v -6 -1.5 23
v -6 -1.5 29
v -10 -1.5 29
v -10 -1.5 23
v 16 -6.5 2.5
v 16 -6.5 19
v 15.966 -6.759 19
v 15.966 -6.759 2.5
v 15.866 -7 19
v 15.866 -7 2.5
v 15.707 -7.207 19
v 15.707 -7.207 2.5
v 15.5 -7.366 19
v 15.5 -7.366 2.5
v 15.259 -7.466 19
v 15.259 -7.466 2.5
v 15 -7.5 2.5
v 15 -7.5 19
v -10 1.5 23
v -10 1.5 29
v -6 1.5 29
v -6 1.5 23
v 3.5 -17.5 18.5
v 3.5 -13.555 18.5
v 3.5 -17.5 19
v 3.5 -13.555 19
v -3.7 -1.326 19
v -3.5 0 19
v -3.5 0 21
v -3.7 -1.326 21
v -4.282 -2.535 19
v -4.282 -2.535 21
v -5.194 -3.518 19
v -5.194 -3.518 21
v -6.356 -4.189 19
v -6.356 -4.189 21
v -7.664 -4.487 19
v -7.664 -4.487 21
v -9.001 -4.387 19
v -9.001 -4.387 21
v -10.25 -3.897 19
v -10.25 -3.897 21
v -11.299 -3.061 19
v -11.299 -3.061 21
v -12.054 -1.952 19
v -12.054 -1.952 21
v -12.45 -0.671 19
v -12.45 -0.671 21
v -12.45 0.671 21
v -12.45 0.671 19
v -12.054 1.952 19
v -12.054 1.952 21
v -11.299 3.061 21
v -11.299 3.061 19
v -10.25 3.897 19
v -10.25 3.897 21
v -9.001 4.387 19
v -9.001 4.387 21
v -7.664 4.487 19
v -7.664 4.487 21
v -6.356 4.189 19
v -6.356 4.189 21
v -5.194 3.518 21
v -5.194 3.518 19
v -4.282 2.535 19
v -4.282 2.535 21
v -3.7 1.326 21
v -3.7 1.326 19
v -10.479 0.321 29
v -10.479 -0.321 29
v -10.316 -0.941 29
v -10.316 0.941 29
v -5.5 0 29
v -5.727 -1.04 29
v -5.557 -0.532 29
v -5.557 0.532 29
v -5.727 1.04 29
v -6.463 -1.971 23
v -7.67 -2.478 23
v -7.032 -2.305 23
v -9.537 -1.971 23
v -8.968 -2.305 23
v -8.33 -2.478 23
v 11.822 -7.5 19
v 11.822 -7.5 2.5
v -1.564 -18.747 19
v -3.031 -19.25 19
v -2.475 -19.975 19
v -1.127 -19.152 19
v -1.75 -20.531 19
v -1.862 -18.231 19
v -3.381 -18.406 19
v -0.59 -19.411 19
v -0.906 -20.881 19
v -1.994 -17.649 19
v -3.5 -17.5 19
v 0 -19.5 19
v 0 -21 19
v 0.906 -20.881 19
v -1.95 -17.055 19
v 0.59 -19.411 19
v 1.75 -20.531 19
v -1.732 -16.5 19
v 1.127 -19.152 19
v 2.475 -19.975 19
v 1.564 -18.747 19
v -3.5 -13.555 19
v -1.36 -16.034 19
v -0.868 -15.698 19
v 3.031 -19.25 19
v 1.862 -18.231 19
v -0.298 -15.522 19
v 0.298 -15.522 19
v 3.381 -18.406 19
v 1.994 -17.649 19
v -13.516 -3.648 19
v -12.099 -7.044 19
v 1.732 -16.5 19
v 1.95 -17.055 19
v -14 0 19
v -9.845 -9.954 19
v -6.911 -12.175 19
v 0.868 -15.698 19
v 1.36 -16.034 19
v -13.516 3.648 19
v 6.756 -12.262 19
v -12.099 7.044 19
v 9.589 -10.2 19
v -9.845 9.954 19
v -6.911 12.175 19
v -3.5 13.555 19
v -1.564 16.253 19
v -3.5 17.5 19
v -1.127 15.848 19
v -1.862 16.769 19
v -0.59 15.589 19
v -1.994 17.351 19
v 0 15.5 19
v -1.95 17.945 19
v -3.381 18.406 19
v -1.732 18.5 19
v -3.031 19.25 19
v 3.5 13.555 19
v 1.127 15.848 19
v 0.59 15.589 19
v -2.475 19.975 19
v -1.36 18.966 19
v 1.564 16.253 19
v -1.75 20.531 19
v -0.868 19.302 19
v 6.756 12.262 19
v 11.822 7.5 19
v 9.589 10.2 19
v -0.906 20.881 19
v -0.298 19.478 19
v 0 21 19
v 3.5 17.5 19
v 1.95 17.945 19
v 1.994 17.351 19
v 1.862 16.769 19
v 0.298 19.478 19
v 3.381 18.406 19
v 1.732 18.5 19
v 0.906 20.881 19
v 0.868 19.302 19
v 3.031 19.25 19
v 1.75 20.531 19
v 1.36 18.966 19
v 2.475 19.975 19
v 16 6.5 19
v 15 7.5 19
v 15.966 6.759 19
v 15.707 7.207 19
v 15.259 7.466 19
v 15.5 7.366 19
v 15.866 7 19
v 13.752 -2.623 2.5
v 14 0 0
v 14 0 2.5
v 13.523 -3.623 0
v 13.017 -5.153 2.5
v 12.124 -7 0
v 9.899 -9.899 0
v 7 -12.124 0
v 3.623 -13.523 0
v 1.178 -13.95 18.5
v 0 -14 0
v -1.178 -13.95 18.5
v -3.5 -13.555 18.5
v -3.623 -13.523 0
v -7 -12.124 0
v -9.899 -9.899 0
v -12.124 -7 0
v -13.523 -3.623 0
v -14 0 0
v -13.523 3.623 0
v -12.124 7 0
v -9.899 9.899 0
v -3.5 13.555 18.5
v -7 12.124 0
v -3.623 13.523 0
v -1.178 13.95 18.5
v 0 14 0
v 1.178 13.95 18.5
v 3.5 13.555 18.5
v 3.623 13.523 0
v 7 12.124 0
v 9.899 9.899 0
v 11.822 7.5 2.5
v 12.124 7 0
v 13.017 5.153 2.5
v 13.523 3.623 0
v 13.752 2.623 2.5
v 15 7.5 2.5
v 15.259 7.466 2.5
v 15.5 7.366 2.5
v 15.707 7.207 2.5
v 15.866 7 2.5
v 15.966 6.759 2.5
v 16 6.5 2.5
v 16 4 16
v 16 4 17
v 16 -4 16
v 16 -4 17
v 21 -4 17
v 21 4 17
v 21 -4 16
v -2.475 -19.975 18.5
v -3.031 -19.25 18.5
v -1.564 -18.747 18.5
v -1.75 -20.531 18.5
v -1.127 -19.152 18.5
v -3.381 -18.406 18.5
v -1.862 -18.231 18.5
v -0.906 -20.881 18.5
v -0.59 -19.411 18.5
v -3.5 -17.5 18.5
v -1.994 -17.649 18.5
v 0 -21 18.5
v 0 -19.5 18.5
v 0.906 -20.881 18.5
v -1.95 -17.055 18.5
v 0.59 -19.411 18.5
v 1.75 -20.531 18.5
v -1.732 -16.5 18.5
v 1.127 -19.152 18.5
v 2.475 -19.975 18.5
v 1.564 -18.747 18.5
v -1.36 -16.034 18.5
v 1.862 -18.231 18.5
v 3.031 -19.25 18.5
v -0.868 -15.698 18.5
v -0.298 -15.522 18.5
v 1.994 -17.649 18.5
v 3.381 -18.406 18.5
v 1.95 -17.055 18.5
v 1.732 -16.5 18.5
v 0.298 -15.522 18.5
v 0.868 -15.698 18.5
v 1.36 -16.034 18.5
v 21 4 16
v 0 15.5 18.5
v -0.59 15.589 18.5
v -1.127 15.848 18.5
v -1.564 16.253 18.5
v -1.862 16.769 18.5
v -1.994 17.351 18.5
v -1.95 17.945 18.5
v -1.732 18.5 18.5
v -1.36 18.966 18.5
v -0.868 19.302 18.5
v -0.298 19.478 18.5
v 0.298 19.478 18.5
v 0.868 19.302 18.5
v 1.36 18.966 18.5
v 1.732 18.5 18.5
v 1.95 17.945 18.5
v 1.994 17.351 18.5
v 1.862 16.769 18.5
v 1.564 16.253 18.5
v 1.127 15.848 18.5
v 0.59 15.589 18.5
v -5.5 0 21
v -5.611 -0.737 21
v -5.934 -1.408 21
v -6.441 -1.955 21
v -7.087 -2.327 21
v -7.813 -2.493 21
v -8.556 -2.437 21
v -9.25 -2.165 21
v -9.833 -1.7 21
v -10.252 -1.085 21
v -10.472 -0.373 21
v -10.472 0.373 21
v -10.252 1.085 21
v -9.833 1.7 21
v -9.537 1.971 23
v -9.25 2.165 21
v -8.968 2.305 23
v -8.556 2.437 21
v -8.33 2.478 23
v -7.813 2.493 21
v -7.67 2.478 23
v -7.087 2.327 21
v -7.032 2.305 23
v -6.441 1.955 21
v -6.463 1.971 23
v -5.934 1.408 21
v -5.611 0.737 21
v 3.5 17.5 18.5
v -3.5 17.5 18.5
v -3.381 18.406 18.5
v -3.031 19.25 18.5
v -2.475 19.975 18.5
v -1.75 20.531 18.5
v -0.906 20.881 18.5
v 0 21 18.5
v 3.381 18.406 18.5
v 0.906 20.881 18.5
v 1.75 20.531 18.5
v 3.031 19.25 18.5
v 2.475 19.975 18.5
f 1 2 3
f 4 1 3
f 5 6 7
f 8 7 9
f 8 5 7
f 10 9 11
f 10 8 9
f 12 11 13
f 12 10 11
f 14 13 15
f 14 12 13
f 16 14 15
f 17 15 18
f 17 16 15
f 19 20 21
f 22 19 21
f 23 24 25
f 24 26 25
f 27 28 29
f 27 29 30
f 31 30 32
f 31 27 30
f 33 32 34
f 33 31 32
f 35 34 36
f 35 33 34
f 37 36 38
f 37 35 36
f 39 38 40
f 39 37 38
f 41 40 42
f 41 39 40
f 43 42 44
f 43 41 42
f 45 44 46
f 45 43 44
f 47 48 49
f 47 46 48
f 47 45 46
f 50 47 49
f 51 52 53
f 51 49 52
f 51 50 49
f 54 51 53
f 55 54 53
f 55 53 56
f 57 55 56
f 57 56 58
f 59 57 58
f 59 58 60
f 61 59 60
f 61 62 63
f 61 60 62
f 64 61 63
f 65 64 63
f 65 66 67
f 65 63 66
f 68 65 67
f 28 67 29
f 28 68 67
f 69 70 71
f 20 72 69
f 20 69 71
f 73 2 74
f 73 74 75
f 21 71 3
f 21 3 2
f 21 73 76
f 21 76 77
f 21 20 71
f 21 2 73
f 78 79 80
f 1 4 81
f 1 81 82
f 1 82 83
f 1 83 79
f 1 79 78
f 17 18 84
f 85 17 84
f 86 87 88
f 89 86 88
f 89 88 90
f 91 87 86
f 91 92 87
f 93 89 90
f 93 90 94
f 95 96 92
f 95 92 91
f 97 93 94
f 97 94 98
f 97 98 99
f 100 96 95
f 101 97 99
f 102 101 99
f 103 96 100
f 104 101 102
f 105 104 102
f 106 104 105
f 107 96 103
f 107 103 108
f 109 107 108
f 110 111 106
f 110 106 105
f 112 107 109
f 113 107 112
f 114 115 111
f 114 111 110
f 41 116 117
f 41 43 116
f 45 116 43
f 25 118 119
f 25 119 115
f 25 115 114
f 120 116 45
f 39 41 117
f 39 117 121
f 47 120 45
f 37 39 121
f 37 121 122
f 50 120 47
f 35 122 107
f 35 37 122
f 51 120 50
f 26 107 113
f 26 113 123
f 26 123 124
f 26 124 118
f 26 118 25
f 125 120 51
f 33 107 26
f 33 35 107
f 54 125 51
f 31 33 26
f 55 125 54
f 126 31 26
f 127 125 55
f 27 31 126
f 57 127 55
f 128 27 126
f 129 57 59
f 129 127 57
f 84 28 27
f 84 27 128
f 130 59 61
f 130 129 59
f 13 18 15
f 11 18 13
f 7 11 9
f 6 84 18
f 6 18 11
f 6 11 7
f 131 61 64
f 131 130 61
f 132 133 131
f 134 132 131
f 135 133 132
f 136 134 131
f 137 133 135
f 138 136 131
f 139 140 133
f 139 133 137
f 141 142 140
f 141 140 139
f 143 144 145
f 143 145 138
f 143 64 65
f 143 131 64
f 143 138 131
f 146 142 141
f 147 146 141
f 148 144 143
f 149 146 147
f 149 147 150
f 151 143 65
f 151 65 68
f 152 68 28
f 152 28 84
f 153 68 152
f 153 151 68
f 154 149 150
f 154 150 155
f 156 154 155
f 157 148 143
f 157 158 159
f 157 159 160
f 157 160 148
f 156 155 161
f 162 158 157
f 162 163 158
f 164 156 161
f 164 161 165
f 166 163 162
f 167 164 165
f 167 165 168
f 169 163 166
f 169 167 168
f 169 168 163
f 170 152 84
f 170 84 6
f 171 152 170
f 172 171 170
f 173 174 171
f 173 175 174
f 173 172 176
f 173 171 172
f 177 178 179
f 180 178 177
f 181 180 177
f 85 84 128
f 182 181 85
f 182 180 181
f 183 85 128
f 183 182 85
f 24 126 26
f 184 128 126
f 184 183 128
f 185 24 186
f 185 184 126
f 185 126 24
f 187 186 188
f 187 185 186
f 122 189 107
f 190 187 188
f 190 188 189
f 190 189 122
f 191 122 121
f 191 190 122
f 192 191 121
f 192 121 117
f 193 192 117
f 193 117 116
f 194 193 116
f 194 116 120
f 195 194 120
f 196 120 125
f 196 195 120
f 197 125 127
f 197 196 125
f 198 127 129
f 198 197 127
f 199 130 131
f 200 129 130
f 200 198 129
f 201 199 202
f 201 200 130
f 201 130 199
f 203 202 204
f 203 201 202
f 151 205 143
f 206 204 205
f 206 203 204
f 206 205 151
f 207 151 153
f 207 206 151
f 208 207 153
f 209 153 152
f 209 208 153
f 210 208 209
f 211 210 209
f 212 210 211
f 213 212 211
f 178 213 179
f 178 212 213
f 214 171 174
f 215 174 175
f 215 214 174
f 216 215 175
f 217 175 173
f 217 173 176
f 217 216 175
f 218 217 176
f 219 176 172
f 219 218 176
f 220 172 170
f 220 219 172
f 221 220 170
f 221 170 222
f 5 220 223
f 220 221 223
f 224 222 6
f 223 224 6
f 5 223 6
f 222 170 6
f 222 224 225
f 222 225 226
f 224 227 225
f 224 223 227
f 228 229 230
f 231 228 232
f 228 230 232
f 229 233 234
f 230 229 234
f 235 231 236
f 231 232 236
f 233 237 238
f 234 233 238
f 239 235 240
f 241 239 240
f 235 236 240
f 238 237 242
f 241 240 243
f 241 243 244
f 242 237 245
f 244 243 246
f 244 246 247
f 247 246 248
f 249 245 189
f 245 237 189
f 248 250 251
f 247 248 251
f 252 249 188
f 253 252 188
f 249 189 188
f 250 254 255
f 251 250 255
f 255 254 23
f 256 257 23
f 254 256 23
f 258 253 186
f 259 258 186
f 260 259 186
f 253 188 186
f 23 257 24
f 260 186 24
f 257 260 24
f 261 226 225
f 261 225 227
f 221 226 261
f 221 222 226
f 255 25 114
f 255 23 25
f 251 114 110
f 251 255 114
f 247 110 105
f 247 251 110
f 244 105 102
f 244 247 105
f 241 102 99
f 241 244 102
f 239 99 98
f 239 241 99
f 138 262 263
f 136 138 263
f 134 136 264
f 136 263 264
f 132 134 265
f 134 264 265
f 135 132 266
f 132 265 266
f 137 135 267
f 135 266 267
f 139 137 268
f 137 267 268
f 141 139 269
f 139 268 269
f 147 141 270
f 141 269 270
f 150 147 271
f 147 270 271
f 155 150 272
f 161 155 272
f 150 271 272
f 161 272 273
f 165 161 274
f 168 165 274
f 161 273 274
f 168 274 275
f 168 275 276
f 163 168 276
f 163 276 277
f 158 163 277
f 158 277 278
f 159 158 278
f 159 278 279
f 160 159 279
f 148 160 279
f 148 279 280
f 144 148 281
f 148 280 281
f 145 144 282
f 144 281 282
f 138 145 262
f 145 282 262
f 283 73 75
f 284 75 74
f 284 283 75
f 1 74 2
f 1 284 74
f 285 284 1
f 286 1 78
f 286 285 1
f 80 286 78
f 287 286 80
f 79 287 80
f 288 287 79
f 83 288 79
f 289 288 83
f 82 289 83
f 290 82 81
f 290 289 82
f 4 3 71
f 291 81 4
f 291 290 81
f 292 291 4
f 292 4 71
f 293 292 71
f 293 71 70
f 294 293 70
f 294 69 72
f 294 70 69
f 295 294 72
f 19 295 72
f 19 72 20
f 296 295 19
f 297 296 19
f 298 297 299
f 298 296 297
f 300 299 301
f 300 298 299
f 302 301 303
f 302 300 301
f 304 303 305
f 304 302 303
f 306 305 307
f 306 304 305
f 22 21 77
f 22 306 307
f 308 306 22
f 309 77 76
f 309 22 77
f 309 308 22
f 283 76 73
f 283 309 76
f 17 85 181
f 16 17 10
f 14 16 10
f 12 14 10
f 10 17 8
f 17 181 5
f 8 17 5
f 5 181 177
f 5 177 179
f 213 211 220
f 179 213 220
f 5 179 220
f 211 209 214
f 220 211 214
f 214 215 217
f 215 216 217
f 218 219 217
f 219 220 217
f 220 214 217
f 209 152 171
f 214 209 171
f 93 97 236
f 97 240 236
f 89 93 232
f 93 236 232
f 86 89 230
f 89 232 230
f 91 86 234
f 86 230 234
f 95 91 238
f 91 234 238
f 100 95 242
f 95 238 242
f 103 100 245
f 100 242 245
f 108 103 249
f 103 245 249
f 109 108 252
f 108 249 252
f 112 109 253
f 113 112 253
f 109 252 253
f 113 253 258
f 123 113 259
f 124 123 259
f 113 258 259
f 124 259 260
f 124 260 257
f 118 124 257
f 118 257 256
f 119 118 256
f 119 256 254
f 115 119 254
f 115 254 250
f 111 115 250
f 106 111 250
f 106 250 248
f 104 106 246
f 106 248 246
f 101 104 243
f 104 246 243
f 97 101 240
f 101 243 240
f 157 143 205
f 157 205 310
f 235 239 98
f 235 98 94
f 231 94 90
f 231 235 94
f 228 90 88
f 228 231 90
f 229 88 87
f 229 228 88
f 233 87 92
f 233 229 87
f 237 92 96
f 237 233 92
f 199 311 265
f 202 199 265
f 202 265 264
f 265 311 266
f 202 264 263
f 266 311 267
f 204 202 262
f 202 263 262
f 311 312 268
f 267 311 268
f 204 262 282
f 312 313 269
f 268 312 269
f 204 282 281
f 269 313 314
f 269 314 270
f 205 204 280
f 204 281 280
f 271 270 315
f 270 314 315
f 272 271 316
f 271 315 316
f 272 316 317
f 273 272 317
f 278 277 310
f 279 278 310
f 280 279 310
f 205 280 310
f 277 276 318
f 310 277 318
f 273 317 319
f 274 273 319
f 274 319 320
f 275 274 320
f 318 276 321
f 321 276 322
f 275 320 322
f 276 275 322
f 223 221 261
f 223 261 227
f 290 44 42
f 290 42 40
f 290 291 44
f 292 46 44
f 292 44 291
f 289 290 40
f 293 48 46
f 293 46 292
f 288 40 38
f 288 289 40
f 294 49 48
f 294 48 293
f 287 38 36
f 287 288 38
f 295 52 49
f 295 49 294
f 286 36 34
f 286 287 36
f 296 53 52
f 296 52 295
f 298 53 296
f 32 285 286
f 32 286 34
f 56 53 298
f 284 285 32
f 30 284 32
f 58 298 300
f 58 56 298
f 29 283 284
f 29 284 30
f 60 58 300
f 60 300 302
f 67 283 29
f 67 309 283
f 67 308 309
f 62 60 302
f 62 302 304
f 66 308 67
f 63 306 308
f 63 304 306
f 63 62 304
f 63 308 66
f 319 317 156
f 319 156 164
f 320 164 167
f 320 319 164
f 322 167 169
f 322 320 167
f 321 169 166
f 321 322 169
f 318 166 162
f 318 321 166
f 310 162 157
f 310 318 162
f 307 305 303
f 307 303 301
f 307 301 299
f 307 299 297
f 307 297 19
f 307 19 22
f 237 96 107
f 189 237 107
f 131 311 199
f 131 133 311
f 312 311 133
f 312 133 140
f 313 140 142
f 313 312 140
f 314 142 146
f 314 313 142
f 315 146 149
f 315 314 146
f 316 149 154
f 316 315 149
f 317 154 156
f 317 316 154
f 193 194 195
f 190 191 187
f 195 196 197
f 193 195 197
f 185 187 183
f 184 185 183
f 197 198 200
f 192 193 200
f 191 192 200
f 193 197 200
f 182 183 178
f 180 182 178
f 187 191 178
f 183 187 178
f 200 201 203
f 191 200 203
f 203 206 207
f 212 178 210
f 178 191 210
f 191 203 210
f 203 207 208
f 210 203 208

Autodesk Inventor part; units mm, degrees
ref_plane "YZ Plane" through (0, 0, 0) normal (1, 0, 0) x (0, 1, 0)
ref_plane "XZ Plane" through (0, 0, 0) normal (0, 1, 0) x (-1, 0, 0)
ref_plane "XY Plane" through (0, 0, 0) normal (0, 0, 1) x (1, 0, 0)
sketch "Sketch1" plane through (0, 0, 0) normal (0, 0, 1) x (1, 0, 0)
  circle A0 centre (0, 0) radius 14
  dimension "d0" = 28
extrude "Extrusion1" add sketch "Sketch1" along normal blind 19
sketch "Sketch2" plane through (0, 0, 19) normal (0, 0, 1) x (1, 0, 0)
  line L0 (10, 7.5) -> (16, 7.5)
  line L1 (16, 7.5) -> (16, -7.5)
  line L2 (16, -7.5) -> (10, -7.5)
  line L3 (10, -7.5) -> (10, 7.5)
  point P0 (0, 0)
  dimension "d3" = 15
  dimension "d4" = 10
  dimension "d5" = 16
  dimension "d6" = 7.5
extrude "Extrusion2" add sketch "Sketch2" against normal blind 16.5
fillet "Fillet1" radius 1 2 edges at (16, 7.5, 10.75) (16, -7.5, 10.75)
sketch "Sketch3" plane through (0, 0, 19) normal (0, 0, 1) x (1, 0, 0)
  circle A0 centre (-8, 0) radius 4.5
  arc A1 (11.8216, 7.5) -> (11.8216, -7.5) centre (0, 0) ccw projected
  dimension "d10" = 9
  dimension "d11" = 0
  dimension "d12" = 8
extrude "Extrusion3" add sketch "Sketch3" along normal blind 2
sketch "Sketch4" plane through (-8, 0, 21) normal (0, 0, 1) x (1, 0, 0)
  circle A0 centre (0, 0) radius 2.5
  point P0 (8, 0)
  dimension "d15" = 5
extrude "Extrusion4" add sketch "Sketch4" along normal blind 8
sketch "Sketch5" plane through (-8, 0, 29) normal (0, 0, 1) x (1, 0, 0)
  circle A0 centre (0, 0) radius 2.5 projected
  circle A1 centre (0, 0) radius 2.5
  line L0 (-3.3103, 1.5) -> (3.6339, 1.5)
  line L1 (3.6339, 1.5) -> (3.6339, -1.5)
  line L2 (3.6339, -1.5) -> (-3.3103, -1.5)
  line L3 (-3.3103, -1.5) -> (-3.3103, 1.5)
  point P0 (8, 0)
  point P1 (2, -1.5)
  point P2 (-2, -1.5)
  point P3 (-2, 1.5)
  point P4 (2, 1.5)
  dimension "d18" = 3
  dimension "d19" = 1.5
extrude "Extrusion5" cut sketch "Sketch5" against normal blind 6 contours L0 A0 | A0 L2
sketch "Sketch6" plane through (16, -6.5, 19) normal (1, 0, 0) x (0, 0, -1)
  line L0 (2, 10.5) -> (3, 10.5)
  line L1 (3, 10.5) -> (3, 2.5)
  line L2 (3, 2.5) -> (2, 2.5)
  line L3 (2, 2.5) -> (2, 10.5)
  line L4 (0, 0) -> (0, 13) projected
  line L5 (16.5, 14) -> (0, 14) projected
  line L6 (0, -1) -> (16.5, -1) projected
  point P0 (19, 6.5)
  dimension "d22" = 2
  dimension "d23" = 1
  dimension "d24" = 3.5
  dimension "d25" = 3.5
extrude "Extrusion6" add sketch "Sketch6" along normal blind 5
sketch "Sketch7" plane through (0, 0, 19) normal (0, 0, 1) x (1, 0, 0)
  line L0 (-3.5, 12) -> (3.5, 12)
  line L1 (3.5, 12) -> (3.5, 21)
  line L2 (3.5, 21) -> (-3.5, 21)
  line L3 (-3.5, 21) -> (-3.5, 12)
  arc A0 (11.8216, 7.5) -> (11.8216, -7.5) centre (0, 0) ccw projected
  line L4 (-3.5, -12) -> (3.5, -12)
  line L5 (3.5, -12) -> (3.5, -21)
  line L6 (3.5, -21) -> (-3.5, -21)
  line L7 (-3.5, -21) -> (-3.5, -12)
  point P0 (0, 14)
  point P1 (0, -14)
  point P2 (3.5, -13.5554)
  point P3 (-3.5, -13.5554)
  point P4 (-3.5, 13.5554)
  point P5 (3.5, 13.5554)
  dimension "d28" = 7
  dimension "d29" = 7
  dimension "d30" = 3.5
  dimension "d31" = 2
  dimension "d32" = 7
  dimension "d33" = 7
  dimension "d34" = 2
  dimension "d35" = 3.5
extrude "Extrusion7" add sketch "Sketch7" against normal blind 0.5 contours A0 L5 L6 L7 | L3 L2 L1 A0
fillet "Fillet2" radius 3.5 4 edges at (-3.5, 21, 18.75) (3.5, 21, 18.75) (-3.5, -21, 18.75) (3.5, -21, 18.75)
sketch "Sketch8" plane through (0, 0, 19) normal (0, 0, 1) x (1, 0, 0)
  arc A0 (3.5, 17.5) -> (-3.5, 17.5) centre (0, 17.5) ccw projected
  arc A1 (-3.5, -17.5) -> (3.5, -17.5) centre (0, -17.5) ccw projected
  point P0 (0, 0)
  dimension "d39" = 0
hole "Hole1" at (0, 17.5, 19) at (0, -17.5, 19) direction (0, 0, -1) diameter 4 depth 1 tip angle 118
properties part number "stepper-motor"
